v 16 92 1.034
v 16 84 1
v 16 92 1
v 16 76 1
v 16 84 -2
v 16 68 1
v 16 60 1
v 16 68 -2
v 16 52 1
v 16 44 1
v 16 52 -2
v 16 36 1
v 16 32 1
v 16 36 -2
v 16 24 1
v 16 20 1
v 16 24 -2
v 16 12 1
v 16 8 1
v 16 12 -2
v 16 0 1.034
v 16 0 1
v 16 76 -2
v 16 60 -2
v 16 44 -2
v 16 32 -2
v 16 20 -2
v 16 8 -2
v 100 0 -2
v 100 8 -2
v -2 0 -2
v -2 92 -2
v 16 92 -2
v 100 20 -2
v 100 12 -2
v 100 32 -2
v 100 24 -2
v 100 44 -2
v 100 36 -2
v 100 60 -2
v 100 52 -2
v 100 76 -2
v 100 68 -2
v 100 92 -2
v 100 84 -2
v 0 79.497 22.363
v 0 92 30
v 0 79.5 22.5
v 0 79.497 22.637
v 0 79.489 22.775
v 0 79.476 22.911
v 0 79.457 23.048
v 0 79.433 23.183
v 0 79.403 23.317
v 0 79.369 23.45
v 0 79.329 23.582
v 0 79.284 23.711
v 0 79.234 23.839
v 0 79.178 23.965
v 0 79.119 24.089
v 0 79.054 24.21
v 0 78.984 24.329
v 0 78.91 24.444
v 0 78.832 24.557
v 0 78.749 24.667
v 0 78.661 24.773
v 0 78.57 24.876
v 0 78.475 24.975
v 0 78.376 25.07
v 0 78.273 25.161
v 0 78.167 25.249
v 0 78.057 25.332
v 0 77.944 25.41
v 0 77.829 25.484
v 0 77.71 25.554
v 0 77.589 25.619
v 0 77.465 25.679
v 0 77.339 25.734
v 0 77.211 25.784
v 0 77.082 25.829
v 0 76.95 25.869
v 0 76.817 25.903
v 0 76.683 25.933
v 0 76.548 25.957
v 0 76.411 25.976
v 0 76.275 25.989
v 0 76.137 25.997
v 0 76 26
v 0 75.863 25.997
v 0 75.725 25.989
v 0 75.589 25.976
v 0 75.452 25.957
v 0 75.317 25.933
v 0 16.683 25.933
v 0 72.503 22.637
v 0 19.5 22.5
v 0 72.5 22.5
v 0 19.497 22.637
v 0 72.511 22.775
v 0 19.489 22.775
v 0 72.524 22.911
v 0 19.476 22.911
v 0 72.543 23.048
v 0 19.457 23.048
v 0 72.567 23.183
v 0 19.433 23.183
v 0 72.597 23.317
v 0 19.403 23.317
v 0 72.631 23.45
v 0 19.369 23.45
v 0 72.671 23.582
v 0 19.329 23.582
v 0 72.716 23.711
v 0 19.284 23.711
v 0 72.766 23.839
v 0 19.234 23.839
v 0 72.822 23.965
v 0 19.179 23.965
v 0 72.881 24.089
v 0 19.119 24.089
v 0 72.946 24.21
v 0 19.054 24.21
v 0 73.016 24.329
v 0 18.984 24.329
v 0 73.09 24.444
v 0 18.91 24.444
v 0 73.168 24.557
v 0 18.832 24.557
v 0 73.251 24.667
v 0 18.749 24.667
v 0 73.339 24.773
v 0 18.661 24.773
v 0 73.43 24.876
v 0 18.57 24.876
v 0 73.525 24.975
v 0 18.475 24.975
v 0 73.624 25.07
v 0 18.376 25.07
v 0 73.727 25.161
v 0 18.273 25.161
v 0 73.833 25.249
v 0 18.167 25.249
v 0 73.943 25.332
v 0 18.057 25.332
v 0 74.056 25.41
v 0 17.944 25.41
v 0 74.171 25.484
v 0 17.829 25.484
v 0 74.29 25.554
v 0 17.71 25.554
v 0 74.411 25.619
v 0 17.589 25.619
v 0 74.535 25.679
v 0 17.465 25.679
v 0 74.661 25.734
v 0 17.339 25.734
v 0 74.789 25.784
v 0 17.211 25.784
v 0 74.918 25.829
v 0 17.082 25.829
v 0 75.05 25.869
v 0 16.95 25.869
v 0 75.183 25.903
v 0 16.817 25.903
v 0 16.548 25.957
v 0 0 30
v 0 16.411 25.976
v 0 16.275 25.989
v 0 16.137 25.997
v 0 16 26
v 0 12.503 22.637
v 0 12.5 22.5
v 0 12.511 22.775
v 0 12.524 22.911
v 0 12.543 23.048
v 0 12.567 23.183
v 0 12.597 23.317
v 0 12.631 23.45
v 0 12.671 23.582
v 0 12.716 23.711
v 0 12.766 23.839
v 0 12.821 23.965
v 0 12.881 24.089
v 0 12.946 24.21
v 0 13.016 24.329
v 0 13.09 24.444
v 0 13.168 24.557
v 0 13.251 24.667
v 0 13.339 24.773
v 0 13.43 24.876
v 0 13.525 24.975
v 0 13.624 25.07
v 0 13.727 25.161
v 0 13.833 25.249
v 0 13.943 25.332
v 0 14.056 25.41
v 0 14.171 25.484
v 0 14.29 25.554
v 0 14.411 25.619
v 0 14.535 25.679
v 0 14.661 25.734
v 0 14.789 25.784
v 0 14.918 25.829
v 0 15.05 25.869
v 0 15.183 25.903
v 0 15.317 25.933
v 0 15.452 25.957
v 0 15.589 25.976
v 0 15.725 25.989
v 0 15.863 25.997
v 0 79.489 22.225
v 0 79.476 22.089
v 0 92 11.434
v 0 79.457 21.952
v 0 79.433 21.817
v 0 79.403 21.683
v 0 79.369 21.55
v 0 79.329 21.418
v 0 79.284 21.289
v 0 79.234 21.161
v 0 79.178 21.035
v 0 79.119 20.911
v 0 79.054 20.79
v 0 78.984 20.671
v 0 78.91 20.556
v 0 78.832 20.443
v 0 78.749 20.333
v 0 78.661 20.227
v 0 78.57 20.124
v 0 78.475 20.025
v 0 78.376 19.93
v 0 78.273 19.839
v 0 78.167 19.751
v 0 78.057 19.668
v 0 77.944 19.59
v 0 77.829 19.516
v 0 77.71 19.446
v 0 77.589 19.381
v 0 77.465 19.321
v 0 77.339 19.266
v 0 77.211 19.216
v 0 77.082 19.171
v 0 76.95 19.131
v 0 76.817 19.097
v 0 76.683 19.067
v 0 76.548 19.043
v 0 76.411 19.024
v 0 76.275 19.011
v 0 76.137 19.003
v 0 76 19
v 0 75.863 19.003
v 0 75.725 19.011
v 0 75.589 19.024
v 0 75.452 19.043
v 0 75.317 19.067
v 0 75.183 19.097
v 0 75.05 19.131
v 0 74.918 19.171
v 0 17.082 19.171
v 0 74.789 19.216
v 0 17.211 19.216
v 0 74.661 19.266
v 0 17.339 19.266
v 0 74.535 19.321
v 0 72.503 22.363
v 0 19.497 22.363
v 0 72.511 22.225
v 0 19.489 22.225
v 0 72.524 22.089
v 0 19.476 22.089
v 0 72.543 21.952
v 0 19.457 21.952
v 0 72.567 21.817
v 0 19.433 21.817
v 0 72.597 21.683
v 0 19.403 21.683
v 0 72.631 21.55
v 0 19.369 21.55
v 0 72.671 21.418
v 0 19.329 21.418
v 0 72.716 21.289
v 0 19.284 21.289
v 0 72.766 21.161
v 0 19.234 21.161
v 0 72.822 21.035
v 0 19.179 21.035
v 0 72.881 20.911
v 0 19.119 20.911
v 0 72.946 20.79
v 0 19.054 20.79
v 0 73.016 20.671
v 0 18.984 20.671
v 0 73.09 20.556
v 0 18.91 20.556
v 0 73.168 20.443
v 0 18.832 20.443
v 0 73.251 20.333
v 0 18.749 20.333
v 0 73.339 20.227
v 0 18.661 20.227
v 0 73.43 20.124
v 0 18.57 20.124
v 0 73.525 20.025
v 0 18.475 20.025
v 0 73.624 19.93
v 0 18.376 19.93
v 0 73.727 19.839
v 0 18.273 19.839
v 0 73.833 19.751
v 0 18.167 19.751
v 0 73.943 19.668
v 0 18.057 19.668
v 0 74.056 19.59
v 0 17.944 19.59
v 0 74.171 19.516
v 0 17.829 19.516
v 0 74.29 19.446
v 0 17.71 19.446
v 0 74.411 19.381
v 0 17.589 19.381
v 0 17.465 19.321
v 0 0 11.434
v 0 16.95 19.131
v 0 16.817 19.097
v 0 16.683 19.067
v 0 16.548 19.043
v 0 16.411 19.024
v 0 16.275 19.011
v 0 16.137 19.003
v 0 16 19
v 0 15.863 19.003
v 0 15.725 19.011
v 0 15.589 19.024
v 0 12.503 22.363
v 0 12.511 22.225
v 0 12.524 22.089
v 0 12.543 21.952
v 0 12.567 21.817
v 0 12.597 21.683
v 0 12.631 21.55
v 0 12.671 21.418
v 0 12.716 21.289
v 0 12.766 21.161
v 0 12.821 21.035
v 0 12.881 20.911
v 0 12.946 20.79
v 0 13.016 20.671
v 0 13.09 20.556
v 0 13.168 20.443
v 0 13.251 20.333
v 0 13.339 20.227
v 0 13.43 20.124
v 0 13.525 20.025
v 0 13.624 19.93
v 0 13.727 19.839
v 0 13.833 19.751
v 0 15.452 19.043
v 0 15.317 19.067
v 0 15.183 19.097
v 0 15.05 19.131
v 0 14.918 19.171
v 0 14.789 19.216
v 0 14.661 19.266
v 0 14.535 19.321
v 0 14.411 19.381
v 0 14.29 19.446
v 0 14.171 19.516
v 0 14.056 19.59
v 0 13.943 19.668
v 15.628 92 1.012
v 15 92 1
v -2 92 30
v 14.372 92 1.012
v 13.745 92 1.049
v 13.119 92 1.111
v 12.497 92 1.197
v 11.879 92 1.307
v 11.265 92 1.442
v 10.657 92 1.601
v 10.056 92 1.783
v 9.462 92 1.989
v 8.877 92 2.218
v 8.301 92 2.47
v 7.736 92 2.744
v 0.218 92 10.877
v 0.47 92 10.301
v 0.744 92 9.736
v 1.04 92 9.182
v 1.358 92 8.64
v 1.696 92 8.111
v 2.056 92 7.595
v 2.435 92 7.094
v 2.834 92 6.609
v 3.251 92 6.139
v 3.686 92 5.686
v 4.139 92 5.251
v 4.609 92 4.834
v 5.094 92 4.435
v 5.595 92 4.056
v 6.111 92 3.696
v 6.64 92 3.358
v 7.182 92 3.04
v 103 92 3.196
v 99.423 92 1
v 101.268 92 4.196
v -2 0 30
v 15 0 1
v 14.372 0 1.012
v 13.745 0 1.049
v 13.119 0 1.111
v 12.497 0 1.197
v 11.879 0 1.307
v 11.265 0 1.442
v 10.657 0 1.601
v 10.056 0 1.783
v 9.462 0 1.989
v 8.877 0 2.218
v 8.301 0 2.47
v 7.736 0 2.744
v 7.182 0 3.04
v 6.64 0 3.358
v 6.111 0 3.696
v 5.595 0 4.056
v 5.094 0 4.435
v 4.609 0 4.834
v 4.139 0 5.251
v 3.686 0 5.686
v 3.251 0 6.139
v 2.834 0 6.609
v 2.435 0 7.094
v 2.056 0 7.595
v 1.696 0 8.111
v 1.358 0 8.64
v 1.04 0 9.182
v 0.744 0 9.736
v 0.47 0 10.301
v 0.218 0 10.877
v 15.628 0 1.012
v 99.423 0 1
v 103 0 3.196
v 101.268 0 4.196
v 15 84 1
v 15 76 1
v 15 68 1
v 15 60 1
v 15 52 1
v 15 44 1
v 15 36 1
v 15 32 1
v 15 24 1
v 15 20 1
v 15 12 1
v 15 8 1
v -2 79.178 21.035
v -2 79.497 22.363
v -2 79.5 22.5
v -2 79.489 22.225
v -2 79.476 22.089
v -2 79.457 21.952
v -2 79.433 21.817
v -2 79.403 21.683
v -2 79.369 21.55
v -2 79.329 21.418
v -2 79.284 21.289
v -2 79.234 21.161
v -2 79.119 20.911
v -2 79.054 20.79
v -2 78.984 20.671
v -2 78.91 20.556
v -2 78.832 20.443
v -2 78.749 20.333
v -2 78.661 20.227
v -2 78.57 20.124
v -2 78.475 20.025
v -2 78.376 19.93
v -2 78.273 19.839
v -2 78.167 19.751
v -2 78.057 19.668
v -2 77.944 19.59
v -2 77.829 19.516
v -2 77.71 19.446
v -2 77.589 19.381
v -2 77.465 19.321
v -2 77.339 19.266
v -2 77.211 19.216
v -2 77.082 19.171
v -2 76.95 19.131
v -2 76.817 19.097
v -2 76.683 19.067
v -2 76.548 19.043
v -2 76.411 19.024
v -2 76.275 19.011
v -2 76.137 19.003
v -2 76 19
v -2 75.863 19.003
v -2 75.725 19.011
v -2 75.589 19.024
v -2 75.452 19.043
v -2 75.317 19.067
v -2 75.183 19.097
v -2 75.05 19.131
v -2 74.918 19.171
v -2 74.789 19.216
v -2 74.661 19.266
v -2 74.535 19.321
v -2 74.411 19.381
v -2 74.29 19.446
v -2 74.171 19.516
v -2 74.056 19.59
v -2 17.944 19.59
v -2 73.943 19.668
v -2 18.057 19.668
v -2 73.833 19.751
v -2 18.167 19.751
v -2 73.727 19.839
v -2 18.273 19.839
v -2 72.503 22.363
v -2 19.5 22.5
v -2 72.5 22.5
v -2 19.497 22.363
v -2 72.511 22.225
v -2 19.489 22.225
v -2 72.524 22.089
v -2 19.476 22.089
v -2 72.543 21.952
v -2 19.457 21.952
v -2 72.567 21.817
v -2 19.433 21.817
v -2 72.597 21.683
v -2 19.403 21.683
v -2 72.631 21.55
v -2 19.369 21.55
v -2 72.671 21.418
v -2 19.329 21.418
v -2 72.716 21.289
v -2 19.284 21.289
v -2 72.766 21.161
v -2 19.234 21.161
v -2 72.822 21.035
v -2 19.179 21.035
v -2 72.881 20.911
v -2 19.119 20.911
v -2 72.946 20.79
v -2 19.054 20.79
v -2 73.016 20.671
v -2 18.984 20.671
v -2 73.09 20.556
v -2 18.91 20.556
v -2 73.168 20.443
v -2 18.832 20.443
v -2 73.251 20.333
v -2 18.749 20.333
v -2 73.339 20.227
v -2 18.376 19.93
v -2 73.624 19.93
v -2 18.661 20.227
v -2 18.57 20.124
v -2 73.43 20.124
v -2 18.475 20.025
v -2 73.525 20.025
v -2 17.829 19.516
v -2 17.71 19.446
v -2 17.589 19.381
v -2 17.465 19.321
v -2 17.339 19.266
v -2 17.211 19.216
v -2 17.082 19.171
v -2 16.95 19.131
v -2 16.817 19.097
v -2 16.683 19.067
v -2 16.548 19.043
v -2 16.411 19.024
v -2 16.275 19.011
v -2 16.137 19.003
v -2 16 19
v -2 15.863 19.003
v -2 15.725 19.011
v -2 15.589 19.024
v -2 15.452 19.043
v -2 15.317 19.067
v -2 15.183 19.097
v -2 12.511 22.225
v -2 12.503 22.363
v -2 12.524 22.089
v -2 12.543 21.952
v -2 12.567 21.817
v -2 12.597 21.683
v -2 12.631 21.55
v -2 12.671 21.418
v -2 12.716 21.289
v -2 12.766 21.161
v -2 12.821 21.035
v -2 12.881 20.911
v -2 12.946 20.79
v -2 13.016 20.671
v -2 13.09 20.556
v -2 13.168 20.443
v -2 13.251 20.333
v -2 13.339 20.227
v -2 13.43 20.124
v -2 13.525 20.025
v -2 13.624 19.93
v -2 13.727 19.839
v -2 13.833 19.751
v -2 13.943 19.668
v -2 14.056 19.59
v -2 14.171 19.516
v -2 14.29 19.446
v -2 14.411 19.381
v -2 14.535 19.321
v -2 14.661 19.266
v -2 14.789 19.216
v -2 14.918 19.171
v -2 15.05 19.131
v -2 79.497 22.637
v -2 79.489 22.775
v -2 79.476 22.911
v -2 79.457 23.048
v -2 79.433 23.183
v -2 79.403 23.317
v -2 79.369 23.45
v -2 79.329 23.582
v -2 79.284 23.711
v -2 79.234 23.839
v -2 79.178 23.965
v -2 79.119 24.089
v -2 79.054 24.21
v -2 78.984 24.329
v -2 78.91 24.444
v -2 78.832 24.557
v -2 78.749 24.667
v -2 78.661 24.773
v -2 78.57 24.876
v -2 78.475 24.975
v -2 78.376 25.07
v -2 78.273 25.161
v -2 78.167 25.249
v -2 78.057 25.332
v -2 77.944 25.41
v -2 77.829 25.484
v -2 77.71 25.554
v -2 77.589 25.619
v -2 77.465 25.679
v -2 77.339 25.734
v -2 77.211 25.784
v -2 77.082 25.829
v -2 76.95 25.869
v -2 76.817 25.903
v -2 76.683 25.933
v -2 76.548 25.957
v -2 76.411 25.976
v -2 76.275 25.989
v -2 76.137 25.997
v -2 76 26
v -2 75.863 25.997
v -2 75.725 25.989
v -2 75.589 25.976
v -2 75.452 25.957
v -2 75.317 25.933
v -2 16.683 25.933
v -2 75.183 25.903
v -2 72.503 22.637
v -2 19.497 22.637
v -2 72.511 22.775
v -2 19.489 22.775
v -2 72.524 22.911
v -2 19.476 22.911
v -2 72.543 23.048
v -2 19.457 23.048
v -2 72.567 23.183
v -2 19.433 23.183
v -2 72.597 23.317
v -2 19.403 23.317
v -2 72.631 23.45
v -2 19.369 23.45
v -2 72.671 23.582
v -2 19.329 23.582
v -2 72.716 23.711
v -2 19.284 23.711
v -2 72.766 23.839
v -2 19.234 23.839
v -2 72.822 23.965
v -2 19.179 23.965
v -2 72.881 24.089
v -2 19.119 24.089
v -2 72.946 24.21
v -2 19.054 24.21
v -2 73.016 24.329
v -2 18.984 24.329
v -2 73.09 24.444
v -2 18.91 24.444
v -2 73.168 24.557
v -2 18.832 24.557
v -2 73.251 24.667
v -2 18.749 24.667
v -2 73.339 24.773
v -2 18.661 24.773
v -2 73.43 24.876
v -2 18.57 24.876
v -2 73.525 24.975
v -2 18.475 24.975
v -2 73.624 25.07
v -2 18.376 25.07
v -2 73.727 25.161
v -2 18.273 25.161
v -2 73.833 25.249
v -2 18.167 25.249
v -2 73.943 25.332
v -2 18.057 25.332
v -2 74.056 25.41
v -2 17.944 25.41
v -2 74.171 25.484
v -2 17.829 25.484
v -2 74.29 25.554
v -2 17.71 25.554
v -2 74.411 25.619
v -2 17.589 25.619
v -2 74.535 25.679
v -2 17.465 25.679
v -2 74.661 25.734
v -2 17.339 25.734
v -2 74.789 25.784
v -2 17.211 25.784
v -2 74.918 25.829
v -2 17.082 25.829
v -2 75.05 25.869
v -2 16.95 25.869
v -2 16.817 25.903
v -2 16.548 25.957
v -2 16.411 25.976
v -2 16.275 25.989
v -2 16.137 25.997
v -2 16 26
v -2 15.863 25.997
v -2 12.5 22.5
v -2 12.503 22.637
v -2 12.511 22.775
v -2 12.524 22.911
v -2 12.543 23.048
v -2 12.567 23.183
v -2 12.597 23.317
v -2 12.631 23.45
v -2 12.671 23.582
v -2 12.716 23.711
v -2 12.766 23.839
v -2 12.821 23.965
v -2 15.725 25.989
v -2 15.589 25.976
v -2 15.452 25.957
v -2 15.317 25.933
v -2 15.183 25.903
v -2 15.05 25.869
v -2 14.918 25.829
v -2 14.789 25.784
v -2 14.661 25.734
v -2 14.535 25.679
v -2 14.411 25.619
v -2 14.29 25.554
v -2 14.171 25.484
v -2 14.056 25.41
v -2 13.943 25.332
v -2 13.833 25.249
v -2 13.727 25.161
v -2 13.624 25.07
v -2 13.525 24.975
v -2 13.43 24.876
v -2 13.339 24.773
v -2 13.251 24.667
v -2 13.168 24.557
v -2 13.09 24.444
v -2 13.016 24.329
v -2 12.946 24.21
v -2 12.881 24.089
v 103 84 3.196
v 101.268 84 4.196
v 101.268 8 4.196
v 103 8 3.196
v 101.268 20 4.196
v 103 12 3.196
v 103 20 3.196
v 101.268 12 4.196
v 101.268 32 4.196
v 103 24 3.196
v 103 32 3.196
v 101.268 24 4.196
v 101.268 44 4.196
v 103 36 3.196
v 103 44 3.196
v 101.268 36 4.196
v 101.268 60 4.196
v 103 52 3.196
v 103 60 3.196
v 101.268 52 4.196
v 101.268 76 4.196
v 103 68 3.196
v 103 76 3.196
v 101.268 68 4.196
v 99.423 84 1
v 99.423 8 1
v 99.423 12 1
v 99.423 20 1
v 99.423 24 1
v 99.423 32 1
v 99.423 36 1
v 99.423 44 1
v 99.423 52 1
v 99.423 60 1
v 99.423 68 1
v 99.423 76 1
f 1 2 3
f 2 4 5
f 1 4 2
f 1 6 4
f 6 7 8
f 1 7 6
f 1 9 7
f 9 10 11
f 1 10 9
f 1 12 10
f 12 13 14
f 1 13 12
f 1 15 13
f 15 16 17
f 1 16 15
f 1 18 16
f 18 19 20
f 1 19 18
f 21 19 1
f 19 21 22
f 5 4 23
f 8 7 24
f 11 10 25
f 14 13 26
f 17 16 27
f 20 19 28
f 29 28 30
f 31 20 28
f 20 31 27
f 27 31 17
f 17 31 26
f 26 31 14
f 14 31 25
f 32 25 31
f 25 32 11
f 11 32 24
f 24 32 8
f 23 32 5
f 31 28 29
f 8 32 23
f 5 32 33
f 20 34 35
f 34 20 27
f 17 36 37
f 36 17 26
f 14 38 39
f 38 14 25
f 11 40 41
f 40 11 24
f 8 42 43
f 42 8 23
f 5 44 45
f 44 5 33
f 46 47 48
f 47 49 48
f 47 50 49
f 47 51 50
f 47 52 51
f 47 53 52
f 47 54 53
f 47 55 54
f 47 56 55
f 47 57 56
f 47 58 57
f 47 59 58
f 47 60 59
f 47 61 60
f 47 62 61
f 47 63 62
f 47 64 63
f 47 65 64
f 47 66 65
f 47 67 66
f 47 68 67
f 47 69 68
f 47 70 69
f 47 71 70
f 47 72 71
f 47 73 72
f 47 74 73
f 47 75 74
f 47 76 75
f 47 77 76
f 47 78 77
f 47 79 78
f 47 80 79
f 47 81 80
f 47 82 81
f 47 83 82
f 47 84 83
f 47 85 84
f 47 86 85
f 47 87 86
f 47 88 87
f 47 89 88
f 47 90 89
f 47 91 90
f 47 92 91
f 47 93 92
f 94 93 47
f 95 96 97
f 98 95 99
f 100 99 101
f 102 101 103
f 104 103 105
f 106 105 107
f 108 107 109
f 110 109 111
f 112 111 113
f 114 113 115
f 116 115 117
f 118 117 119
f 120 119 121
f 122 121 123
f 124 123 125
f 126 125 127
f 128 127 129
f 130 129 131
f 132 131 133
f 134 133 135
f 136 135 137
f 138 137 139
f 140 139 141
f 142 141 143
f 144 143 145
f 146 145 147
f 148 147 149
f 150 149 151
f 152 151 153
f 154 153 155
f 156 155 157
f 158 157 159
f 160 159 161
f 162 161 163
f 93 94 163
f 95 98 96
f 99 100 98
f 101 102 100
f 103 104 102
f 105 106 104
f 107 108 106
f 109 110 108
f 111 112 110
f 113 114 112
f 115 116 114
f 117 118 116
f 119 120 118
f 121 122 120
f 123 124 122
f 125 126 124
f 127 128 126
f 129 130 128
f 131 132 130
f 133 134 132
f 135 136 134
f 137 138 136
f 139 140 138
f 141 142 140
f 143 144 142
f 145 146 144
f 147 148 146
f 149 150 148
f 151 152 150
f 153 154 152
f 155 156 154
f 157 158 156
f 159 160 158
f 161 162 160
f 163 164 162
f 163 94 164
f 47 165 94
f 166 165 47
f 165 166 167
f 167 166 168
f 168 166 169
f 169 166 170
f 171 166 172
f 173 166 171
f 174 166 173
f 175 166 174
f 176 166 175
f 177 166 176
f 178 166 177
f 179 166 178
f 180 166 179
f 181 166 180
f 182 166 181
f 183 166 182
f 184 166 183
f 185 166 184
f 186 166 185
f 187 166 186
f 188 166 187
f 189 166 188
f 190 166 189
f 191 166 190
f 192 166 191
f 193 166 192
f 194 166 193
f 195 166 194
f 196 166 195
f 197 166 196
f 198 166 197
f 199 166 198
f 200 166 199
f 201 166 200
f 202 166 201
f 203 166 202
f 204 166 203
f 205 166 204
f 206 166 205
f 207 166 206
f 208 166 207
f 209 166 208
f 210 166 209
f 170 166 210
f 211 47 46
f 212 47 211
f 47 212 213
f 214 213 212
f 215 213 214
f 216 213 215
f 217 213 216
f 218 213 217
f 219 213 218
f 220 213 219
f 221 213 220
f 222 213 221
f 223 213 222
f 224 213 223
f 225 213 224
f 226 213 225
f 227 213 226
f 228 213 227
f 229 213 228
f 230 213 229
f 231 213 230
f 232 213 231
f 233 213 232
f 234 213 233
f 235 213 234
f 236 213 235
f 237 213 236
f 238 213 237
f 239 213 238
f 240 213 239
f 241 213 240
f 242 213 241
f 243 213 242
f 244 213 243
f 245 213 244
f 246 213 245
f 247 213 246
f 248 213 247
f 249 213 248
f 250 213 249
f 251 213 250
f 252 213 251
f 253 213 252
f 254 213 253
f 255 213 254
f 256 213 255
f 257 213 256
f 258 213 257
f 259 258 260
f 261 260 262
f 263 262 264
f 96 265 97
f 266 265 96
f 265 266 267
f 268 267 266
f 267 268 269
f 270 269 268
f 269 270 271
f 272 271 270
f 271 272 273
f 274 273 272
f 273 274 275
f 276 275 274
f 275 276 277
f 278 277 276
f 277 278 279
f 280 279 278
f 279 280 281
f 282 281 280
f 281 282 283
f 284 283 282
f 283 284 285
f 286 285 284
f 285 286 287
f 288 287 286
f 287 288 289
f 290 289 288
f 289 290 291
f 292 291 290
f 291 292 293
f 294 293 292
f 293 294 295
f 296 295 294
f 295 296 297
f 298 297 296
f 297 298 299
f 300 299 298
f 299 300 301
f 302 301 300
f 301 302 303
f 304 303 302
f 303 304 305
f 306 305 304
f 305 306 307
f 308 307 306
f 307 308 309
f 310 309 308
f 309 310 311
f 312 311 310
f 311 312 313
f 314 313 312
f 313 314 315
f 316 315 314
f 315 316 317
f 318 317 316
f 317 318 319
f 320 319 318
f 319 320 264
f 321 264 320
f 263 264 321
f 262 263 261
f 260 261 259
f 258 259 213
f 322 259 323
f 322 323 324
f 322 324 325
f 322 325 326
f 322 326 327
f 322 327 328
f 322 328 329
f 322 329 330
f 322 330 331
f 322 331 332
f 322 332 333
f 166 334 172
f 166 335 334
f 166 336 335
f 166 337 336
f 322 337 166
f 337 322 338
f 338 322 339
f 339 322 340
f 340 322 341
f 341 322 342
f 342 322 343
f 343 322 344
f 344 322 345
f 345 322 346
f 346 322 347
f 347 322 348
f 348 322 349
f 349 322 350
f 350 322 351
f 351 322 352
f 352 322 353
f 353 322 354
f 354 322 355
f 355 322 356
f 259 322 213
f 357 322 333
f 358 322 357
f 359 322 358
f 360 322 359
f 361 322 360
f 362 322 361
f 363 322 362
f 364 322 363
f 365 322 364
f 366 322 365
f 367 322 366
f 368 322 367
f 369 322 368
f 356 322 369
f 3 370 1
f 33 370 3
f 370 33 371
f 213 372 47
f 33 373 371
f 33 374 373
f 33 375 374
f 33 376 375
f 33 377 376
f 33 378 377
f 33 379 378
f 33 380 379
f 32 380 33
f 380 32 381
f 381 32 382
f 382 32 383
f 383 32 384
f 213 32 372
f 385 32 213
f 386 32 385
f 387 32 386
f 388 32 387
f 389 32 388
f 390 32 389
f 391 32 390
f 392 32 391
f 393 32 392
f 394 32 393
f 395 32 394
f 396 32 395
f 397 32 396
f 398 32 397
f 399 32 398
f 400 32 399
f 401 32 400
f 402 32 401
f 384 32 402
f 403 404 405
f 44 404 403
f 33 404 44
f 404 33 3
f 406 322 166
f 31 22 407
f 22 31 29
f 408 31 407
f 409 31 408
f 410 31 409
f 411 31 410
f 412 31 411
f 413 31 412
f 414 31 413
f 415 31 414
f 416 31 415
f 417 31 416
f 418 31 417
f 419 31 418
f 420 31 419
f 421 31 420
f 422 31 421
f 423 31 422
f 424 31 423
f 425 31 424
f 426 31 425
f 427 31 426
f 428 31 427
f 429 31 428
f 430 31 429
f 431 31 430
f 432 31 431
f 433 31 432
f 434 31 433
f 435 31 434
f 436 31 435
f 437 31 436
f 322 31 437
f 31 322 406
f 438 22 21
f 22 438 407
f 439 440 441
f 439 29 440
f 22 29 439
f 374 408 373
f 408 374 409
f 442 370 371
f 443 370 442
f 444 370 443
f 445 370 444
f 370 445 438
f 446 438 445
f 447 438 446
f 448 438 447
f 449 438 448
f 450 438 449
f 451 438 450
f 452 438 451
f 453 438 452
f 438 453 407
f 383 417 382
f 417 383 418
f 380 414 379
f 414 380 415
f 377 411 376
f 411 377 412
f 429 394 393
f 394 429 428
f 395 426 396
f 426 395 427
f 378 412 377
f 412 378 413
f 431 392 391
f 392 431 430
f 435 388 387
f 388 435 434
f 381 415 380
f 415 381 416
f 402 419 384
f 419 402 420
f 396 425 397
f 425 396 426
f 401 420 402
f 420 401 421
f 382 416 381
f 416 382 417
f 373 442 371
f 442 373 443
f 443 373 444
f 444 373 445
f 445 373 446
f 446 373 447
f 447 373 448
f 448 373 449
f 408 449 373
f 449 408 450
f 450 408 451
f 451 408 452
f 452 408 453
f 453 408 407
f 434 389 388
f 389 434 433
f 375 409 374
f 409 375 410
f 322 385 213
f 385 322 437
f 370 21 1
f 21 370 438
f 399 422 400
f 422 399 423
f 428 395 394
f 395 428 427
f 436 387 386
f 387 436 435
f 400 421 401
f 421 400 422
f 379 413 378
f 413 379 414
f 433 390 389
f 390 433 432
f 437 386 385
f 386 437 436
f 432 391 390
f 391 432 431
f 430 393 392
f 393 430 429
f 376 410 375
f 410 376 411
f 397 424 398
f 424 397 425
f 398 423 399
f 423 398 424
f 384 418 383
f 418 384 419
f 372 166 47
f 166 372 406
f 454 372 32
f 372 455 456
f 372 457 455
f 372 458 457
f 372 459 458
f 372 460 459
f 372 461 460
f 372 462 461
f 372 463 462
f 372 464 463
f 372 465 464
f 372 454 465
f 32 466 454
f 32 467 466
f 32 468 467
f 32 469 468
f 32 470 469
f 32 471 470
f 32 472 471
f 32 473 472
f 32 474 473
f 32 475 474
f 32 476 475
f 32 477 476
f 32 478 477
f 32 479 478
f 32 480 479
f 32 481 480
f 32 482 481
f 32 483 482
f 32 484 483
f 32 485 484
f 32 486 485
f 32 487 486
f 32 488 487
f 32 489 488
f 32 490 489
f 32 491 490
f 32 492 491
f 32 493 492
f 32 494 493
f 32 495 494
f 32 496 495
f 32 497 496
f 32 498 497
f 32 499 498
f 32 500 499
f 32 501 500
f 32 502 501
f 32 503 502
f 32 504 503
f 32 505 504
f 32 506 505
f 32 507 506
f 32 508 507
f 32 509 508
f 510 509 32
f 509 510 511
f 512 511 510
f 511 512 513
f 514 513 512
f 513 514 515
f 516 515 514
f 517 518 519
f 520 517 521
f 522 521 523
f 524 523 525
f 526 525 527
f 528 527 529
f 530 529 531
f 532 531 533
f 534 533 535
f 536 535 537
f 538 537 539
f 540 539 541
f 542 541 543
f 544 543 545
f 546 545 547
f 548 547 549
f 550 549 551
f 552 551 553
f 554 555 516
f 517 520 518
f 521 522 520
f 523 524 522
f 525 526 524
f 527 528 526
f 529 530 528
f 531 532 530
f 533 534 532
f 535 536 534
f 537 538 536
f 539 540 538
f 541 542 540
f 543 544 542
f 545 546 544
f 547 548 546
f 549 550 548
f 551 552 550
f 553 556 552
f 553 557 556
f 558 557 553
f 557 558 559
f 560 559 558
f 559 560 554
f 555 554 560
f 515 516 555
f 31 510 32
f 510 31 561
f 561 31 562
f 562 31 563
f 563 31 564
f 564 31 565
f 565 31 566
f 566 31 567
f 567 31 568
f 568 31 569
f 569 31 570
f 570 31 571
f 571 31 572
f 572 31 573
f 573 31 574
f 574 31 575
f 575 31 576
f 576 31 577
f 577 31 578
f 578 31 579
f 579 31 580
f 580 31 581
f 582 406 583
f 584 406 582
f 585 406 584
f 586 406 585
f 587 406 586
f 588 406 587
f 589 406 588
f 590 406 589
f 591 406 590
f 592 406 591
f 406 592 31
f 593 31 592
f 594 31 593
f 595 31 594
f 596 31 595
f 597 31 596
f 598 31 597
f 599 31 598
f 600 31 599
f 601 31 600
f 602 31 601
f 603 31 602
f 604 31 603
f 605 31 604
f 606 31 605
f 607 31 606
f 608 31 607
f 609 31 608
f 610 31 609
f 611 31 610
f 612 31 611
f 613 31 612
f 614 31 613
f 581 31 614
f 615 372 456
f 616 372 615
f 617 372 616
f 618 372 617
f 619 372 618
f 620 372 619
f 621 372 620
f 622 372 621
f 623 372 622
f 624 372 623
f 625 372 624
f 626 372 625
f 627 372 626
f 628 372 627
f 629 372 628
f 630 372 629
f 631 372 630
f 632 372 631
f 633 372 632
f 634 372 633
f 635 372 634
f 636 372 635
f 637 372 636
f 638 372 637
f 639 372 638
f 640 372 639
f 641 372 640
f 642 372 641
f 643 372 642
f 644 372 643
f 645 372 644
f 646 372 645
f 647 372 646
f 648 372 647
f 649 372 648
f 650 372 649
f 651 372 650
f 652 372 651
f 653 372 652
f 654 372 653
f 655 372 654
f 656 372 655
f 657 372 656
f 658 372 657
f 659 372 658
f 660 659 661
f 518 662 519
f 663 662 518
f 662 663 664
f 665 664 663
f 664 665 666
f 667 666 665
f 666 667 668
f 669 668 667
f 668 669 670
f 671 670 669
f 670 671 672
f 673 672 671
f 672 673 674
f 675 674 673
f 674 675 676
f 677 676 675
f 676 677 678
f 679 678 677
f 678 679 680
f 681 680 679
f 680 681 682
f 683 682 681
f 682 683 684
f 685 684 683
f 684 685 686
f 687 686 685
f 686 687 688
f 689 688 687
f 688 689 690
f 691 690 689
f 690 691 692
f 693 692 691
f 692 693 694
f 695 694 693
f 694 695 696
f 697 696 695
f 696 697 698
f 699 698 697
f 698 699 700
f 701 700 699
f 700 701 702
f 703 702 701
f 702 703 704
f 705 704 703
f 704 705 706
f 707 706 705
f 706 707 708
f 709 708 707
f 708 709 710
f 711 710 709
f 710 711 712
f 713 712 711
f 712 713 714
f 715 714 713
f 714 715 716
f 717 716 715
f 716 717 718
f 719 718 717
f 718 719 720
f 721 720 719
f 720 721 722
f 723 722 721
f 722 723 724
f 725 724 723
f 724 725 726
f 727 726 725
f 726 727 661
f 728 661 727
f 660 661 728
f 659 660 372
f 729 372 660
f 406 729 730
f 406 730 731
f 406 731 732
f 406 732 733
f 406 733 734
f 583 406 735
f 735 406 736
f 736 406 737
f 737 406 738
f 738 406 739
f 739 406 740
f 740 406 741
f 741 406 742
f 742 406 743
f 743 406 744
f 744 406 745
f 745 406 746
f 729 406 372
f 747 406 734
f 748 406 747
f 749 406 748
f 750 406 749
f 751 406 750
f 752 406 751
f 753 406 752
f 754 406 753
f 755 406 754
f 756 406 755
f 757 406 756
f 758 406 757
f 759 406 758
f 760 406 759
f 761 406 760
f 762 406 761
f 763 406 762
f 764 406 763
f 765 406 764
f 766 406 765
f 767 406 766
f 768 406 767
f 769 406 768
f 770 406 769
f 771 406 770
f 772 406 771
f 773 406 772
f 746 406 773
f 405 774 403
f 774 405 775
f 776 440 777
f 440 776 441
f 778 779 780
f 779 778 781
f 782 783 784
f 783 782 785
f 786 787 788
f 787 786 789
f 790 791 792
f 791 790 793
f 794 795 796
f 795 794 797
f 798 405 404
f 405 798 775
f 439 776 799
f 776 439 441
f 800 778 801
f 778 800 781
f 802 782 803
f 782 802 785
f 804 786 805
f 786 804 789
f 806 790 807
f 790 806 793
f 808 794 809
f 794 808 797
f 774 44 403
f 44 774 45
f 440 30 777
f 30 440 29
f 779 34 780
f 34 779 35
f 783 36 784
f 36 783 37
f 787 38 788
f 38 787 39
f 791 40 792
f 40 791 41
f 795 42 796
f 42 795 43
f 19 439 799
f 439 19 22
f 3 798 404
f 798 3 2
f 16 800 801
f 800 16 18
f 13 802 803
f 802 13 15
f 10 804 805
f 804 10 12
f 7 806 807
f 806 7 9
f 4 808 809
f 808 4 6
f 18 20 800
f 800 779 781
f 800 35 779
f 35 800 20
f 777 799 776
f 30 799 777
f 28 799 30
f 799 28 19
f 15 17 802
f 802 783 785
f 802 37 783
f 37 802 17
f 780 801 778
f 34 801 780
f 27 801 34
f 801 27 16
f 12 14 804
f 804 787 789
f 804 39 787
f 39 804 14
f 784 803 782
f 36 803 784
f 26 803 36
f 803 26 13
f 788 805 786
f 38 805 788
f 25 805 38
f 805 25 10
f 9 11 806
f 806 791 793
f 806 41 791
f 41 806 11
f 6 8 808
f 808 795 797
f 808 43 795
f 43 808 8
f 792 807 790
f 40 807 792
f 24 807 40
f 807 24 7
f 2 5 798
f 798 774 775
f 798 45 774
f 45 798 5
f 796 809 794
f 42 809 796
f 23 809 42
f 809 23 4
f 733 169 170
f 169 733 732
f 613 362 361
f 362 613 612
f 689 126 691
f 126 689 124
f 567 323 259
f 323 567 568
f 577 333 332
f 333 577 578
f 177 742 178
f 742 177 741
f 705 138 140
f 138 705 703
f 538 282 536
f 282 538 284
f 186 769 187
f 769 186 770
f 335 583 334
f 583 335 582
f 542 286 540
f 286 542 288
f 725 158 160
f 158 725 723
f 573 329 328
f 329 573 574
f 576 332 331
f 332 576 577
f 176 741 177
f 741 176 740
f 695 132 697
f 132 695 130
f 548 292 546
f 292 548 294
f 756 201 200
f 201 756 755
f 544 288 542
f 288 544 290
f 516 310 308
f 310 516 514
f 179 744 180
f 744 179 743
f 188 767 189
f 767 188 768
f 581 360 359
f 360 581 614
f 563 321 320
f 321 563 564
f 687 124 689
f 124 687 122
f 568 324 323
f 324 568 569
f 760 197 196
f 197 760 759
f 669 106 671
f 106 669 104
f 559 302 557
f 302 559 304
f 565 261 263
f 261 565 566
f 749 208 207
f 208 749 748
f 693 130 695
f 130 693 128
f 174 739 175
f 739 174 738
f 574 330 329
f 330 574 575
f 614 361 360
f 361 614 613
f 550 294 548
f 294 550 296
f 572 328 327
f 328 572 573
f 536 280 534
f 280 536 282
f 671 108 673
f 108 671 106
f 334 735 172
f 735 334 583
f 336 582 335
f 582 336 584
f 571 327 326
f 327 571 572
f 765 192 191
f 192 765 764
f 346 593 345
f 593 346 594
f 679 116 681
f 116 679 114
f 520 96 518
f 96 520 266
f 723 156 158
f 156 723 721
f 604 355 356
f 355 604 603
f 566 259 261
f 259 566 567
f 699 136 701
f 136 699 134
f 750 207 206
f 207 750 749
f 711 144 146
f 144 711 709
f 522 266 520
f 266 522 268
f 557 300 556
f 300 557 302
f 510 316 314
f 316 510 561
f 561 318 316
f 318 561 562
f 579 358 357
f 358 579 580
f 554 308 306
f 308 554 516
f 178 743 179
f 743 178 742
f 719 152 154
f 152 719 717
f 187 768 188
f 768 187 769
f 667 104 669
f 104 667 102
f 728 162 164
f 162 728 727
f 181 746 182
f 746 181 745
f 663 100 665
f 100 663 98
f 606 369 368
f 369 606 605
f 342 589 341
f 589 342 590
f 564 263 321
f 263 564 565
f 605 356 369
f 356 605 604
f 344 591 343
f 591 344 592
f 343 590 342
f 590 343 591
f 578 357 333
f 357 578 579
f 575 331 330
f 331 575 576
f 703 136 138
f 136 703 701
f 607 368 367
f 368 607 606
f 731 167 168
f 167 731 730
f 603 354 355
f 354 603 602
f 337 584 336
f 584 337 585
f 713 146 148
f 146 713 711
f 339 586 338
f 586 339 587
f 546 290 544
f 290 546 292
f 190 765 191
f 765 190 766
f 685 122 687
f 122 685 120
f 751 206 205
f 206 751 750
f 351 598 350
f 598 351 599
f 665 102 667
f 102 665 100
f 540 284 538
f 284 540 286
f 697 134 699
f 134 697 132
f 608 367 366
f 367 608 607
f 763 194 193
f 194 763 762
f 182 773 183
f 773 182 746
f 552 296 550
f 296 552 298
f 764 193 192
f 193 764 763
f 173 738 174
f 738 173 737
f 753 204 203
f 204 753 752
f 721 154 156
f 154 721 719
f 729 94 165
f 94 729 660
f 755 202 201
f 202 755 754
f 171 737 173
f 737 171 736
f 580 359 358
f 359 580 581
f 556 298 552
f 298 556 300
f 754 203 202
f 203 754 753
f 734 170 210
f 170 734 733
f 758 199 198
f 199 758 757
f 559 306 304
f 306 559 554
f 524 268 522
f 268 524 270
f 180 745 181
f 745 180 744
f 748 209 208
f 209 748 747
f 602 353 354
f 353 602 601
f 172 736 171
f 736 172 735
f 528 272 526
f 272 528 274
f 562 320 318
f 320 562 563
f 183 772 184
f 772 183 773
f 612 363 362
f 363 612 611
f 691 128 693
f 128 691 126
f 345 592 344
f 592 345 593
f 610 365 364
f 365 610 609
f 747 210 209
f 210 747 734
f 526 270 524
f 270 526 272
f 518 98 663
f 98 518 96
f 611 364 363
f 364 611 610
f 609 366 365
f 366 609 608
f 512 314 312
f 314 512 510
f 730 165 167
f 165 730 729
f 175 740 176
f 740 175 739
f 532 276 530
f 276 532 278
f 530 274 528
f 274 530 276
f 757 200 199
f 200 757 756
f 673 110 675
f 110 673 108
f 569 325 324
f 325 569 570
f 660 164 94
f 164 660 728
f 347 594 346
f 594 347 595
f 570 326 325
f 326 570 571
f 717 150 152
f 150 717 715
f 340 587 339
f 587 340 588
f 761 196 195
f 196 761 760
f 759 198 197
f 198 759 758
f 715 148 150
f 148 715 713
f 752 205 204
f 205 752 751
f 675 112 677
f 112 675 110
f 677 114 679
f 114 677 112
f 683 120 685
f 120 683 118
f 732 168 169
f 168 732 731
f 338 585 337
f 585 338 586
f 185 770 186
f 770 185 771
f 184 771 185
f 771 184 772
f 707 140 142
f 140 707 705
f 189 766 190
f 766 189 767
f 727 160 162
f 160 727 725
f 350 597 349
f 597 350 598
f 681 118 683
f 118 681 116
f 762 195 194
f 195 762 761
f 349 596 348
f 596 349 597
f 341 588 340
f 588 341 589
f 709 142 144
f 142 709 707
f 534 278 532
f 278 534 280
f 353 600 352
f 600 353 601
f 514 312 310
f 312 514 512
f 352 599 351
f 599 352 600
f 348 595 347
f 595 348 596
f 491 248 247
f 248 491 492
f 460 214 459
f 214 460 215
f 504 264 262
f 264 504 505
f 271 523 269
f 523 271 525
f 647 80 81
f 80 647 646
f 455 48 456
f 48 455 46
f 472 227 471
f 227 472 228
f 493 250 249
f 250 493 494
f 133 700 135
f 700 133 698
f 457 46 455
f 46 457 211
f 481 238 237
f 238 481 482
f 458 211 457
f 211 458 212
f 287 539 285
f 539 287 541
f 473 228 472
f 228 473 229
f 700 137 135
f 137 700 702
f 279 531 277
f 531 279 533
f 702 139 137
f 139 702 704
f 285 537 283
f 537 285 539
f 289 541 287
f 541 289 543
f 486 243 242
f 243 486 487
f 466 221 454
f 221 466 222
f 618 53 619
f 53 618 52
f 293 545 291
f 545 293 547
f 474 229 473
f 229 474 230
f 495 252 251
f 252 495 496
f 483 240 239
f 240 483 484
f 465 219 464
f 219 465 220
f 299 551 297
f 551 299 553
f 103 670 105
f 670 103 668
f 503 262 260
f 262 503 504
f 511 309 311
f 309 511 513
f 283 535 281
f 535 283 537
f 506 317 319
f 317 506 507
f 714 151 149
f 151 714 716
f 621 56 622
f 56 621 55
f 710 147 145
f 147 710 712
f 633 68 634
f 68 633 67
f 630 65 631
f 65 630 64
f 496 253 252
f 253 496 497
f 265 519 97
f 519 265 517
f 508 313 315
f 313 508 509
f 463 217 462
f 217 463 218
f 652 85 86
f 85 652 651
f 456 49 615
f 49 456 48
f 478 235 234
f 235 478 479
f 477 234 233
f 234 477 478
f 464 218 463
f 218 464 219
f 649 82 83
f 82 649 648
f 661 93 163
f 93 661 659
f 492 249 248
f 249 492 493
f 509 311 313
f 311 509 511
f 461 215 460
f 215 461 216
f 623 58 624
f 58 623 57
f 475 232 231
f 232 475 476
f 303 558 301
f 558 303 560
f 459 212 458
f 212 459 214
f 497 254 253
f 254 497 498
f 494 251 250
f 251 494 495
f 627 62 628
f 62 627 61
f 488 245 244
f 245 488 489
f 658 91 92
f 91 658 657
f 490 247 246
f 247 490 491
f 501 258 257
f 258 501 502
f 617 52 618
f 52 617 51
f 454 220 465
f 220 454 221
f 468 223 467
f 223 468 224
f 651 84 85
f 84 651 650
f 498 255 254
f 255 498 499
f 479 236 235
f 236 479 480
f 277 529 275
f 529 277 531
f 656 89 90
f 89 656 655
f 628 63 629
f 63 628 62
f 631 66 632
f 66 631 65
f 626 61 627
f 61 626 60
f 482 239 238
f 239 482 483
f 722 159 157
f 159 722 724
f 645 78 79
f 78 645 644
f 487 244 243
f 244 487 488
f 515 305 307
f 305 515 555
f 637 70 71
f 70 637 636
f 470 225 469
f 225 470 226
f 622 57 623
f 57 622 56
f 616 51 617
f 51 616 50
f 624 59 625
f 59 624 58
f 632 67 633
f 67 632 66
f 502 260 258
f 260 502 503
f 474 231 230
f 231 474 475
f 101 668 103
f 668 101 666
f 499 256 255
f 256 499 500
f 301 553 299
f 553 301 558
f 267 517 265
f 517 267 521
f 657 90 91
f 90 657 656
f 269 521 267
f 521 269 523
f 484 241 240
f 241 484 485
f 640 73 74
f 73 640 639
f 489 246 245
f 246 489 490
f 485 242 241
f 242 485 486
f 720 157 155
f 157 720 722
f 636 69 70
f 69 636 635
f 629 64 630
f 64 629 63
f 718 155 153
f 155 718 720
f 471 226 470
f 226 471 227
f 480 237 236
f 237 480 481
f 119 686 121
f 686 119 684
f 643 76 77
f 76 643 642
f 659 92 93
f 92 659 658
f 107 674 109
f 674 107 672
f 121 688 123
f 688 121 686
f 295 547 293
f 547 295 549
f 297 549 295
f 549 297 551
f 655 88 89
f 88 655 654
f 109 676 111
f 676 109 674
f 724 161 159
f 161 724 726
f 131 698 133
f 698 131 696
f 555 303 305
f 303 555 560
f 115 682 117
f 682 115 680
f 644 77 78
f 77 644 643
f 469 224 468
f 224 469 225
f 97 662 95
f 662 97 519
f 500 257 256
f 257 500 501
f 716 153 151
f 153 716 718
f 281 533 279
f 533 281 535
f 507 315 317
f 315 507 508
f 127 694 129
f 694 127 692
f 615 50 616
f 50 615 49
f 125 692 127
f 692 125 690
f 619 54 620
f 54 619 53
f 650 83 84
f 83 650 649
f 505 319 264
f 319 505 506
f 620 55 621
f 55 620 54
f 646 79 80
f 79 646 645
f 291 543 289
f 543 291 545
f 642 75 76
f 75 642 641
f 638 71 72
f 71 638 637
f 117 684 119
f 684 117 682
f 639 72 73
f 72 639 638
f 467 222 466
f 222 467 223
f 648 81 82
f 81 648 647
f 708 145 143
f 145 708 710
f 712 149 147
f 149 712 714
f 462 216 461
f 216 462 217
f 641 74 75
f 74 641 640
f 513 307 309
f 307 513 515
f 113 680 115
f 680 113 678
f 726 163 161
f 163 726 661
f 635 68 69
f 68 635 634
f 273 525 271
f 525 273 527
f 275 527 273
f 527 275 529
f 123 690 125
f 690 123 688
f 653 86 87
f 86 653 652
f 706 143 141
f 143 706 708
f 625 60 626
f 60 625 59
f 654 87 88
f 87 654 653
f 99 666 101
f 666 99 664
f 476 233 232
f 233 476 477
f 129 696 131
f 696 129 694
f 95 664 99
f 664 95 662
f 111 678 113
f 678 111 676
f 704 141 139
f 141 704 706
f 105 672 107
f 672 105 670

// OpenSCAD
// Created  by James Trimble - keybase.io/jamestrimble
// Released under Creative Commons - Attribution - Share Alike license

// preview[view:north east, tilt:top diagonal]
Number_Of_4mm_Slots = 3;
Number_Of_8mm_Slots = 3;
Reenforcement = true; //[true,false]


cablerack(Number_Of_4mm_Slots,Number_Of_8mm_Slots,Reenforcement);

module cablerack(num4mm, num8mm, reenforcements) {
	$fn = max($fn, 160);
	spacing = 8;
	thickness = 3;
	backHeight = 30;
	fingerLength = 100;
	rackWidth = num4mm*4+num8mm*8+(2+(num4mm+num8mm-1))*spacing;
	screwHoleRadius = 3.5;
	loc = 8;
	rsize = 16;

	
	difference() {
		union() {
			if (reenforcements==true) {
				// Create the re-enforcement area
				difference() { 
					translate([0,0,-2]) cube([rsize,rackWidth,rsize]);
					translate([rsize-1,-4,rsize+1]) rotate([-90,0,0]) cylinder(r=16,h=rackWidth*2, center=false);
				}
			}

			difference() {
				// Create the solid cable rack
				union() {
					translate([-2,0,0]) cube([2,rackWidth,backHeight]); // back plate
					translate([fingerLength,0,-2]) rotate([0,-60,0]) cube([6,rackWidth,2]); // edge lip
					translate([-2,0,1]) rotate ([0,90,0]) cube([3,rackWidth,fingerLength+2]);
				}

				// subtract the slots
				for (i4mm = [loc:4+spacing:loc+(4+spacing)*num4mm]) {
					translate([1,i4mm,-8]) cube([2*fingerLength,4,2*backHeight]);
				}

				for (i8mm = [loc+(4+spacing)*num4mm:8+spacing:(loc+(4+spacing)*num4mm)+((8+spacing)*num8mm)]) {
					translate([1,i8mm,-8]) cube([2*fingerLength,8,2*backHeight]);
				}
			}
		}
		
		// create the screw holes
		if (num4mm+num8mm<=2) {
			translate([0,rackWidth/2,backHeight-1.5*screwHoleRadius]) rotate([0,90,0]) cylinder(r=screwHoleRadius,h=thickness*3, center=true);
			translate([0,rackWidth/2,backHeight/2]) rotate([0,90,0]) cylinder(r=screwHoleRadius,h=thickness*3, center=true);
		} else {
			translate([0,2*spacing,backHeight*.75]) rotate([0,90,0]) cylinder(r=screwHoleRadius,h=thickness*3, center=true);
			translate([0,rackWidth-2*spacing,backHeight*.75]) rotate([0,90,0]) cylinder(r=screwHoleRadius,h=thickness*3, center=true);
		}

	}
}
